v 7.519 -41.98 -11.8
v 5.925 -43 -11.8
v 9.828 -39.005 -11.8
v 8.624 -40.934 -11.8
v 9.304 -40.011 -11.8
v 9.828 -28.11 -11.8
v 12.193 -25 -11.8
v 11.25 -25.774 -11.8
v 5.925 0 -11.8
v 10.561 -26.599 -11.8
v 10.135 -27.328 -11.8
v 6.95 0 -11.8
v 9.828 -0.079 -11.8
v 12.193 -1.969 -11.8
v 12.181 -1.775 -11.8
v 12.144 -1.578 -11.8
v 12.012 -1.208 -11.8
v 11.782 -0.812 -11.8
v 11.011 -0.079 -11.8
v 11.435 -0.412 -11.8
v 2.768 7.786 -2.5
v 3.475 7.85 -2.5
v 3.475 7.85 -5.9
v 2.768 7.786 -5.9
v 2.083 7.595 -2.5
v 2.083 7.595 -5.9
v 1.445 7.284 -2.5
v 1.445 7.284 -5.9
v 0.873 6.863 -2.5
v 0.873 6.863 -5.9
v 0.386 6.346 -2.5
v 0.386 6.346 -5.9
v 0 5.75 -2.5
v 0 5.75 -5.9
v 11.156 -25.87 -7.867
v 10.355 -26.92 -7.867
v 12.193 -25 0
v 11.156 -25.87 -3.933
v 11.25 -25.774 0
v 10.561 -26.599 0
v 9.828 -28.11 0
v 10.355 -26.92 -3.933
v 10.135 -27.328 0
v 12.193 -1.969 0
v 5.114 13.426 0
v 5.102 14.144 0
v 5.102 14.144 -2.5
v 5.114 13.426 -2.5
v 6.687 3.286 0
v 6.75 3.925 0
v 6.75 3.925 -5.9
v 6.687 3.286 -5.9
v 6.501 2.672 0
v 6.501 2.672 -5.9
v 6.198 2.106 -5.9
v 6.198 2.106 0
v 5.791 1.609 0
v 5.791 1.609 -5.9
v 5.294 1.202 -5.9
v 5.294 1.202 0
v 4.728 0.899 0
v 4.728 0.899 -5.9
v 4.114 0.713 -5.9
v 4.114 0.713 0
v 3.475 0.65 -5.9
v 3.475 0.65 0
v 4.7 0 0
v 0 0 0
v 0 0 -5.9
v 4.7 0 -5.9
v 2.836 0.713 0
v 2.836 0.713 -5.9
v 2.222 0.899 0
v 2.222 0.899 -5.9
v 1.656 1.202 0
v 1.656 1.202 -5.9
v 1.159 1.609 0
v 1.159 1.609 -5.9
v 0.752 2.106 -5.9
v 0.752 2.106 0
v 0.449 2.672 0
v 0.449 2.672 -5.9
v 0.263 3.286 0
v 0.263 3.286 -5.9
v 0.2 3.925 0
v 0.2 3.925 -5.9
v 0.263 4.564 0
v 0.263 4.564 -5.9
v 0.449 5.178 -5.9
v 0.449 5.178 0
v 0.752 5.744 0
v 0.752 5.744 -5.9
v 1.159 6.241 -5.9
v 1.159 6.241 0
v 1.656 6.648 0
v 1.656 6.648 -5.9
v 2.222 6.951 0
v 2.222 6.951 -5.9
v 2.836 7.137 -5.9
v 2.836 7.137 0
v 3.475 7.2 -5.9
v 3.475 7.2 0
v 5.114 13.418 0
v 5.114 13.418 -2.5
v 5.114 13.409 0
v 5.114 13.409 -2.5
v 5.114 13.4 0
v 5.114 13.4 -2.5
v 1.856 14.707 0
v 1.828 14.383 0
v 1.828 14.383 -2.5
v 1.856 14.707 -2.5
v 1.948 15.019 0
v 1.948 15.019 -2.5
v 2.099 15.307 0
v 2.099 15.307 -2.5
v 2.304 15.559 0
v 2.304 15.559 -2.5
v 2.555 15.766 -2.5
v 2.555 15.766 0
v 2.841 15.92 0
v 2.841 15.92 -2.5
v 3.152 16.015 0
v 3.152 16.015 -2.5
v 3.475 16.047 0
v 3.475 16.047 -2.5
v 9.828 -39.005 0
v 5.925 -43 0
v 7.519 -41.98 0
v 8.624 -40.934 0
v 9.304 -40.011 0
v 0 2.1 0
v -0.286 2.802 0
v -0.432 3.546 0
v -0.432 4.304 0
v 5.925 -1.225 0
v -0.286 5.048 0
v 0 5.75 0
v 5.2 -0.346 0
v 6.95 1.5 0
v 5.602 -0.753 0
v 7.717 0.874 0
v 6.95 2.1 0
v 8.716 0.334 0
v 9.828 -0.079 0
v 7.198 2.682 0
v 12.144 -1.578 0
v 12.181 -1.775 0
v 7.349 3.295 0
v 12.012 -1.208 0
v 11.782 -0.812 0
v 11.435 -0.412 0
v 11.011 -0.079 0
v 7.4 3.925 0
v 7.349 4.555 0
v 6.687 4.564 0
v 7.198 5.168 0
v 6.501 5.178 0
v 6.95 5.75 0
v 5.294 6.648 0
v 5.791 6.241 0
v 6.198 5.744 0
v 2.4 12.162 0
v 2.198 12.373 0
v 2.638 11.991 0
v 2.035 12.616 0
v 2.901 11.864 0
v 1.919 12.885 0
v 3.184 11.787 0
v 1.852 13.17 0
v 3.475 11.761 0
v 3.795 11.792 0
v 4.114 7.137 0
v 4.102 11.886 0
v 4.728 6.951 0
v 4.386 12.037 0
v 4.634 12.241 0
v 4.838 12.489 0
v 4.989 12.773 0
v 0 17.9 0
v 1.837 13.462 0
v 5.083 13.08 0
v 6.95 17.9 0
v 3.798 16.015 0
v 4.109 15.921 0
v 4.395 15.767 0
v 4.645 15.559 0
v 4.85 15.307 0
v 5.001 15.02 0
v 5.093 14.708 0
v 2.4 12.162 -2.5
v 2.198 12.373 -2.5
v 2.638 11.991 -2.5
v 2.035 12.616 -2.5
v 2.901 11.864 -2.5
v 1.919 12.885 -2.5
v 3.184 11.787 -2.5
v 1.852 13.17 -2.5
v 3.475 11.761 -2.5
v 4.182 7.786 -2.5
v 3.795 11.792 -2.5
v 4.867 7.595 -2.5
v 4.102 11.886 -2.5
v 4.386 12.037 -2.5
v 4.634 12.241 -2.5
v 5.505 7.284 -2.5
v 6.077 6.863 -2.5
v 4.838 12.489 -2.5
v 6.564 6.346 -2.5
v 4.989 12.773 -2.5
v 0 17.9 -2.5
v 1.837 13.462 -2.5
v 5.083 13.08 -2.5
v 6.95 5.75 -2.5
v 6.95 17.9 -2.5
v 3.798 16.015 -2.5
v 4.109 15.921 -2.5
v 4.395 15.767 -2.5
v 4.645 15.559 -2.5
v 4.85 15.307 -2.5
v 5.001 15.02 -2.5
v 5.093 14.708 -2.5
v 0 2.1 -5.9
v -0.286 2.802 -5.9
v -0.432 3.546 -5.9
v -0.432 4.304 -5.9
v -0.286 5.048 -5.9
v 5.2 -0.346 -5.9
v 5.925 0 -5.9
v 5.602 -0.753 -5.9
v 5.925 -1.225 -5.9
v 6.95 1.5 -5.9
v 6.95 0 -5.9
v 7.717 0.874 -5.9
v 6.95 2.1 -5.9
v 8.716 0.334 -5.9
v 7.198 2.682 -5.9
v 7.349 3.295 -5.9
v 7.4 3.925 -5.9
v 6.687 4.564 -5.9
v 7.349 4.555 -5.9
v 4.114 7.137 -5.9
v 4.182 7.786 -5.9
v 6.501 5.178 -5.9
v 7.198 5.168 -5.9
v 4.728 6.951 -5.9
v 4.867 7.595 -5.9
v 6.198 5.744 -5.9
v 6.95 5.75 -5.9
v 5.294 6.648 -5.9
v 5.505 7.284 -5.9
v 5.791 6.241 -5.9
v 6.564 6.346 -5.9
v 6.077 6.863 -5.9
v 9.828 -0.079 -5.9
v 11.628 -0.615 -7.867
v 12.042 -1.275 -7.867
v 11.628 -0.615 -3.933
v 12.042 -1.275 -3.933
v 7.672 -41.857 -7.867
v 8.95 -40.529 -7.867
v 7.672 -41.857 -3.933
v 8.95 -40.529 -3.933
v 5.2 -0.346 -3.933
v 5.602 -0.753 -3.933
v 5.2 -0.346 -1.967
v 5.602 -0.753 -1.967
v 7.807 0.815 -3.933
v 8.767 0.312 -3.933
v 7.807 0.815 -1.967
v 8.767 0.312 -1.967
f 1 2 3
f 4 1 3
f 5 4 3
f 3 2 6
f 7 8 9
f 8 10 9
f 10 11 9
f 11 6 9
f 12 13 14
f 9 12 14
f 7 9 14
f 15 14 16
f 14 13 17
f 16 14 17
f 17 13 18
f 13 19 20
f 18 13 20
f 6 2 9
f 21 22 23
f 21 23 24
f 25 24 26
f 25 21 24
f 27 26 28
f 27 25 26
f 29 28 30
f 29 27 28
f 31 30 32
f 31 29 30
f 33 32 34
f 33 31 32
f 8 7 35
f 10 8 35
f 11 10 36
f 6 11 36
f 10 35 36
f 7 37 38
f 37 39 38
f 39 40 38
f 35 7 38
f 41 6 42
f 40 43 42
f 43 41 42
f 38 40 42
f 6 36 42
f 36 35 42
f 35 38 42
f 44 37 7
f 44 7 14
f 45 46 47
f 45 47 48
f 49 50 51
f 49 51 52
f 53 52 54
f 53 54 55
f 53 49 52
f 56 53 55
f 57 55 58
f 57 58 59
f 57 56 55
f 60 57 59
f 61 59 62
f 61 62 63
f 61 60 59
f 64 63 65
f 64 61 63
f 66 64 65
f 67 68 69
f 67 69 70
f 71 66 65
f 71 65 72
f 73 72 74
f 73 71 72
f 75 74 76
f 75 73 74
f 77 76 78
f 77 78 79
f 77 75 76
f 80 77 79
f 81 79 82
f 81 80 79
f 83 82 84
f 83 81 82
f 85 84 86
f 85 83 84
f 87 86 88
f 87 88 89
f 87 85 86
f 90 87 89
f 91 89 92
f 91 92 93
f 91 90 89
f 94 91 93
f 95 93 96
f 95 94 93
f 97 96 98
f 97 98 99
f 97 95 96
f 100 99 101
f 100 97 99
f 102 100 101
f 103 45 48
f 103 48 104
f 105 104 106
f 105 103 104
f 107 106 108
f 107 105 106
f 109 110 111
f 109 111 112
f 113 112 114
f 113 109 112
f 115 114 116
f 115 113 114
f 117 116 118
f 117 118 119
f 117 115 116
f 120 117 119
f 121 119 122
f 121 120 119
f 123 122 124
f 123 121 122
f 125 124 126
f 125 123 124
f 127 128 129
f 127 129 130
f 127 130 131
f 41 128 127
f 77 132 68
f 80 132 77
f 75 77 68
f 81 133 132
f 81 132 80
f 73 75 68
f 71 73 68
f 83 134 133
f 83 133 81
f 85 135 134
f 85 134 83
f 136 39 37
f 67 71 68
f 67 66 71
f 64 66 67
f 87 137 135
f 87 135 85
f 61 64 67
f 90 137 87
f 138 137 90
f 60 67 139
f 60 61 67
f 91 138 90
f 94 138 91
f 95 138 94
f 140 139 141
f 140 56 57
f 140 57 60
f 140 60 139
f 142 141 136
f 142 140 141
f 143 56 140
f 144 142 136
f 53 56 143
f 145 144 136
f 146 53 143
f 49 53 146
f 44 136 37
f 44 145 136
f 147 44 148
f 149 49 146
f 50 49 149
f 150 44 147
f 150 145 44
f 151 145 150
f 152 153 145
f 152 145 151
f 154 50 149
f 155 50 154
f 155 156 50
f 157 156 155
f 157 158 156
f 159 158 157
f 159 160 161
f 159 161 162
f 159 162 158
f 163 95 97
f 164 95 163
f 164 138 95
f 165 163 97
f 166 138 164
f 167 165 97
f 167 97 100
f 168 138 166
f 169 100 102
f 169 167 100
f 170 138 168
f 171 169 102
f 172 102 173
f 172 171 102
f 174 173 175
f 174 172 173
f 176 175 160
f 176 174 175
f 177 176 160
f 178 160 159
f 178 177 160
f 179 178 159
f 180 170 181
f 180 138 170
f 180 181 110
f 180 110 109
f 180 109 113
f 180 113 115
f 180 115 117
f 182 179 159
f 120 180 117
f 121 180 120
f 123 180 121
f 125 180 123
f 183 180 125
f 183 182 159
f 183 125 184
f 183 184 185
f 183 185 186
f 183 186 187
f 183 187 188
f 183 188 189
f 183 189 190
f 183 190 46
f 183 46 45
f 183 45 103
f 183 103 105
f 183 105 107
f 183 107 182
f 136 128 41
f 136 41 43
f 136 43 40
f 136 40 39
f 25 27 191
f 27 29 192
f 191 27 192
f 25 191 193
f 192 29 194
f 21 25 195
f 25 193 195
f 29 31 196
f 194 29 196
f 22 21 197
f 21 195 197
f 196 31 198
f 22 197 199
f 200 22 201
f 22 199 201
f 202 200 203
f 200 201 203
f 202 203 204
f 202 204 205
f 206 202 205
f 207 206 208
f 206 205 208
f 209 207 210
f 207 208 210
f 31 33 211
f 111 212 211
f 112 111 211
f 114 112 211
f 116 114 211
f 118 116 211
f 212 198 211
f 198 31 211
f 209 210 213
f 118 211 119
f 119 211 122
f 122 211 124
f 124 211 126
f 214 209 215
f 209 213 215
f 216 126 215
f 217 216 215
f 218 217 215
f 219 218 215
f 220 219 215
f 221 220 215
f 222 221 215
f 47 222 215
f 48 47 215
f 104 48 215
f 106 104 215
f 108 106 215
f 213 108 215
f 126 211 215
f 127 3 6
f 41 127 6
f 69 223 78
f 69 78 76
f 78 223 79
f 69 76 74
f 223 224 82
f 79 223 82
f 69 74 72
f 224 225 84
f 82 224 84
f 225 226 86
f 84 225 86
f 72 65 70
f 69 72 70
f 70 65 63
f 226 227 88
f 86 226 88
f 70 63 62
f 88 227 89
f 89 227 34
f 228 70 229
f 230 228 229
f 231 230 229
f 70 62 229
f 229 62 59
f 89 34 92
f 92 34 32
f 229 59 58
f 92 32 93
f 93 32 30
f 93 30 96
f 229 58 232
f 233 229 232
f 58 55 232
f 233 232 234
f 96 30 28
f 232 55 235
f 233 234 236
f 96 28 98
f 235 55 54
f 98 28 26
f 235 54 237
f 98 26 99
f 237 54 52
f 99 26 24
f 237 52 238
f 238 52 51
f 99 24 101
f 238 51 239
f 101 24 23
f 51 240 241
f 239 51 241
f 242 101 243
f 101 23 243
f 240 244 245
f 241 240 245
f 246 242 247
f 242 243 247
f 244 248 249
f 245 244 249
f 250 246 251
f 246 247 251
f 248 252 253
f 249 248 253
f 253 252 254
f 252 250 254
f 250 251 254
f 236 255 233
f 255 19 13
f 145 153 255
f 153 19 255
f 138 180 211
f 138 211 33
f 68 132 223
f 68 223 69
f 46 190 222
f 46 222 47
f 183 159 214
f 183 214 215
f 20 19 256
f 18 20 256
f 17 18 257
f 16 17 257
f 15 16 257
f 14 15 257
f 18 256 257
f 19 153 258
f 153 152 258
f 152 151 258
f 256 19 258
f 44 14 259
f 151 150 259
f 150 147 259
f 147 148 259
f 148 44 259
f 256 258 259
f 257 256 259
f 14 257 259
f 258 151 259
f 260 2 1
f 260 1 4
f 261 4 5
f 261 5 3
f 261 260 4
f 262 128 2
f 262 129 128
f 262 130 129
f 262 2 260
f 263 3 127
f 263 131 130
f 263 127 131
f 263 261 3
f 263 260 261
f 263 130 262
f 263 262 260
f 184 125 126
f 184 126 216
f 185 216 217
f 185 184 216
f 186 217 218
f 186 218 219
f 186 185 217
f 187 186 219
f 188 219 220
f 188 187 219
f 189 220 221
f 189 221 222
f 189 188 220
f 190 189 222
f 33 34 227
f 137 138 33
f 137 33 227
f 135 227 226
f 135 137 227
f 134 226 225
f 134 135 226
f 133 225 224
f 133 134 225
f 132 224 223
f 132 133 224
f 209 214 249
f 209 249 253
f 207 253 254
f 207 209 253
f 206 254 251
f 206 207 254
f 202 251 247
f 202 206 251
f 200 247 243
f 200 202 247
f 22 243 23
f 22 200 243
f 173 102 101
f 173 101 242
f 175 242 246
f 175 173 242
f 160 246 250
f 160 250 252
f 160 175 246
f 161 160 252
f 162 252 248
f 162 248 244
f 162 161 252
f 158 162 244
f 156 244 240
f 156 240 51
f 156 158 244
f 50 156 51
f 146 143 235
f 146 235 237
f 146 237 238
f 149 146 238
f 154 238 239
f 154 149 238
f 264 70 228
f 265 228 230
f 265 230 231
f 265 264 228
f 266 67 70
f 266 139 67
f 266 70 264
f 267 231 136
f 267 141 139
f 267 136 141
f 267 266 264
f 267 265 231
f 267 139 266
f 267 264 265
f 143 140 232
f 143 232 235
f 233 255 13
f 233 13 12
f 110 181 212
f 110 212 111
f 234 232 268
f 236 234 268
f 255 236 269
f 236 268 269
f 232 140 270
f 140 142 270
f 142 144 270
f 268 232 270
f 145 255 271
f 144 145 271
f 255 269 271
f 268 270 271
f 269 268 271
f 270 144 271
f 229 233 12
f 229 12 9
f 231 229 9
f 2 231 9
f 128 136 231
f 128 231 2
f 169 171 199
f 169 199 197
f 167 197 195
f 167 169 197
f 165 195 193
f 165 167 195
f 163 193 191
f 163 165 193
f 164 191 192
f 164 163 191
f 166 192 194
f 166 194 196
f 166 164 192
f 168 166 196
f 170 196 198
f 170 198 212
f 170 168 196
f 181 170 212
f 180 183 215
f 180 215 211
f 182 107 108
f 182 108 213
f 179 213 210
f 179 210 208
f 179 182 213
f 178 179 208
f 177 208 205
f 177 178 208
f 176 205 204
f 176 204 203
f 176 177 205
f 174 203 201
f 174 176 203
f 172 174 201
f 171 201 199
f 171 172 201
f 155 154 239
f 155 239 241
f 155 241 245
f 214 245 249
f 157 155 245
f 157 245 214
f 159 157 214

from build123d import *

# Parameters (mm, degrees)
F1_DEPTH = 5.9
F2_DEPTH = 2.5
F3_DEPTH = 11.8


with BuildPart() as f1:
    # F0 (on Top) → F1 (new body)
    with BuildSketch(Plane.XY):
        with BuildLine():
            Line((3.475, 0.65), (3.475, 0))
            ThreePointArc((3.475, 0), (4.7730375063, 0.2208504846), (5.925, 0.8585484677))
            ThreePointArc((5.925, 0.8585484677), (6.5018486959, 1.426237912), (6.95, 2.1001712409))
            Line((6.95, 2.1001712409), (6.95, 5.7498287591))
            ThreePointArc((6.95, 5.7498287591), (5.5051689733, 7.2841723593), (3.475, 7.85))
            Line((3.475, 7.85), (3.475, 7.2))
            ThreePointArc((3.475, 7.2), (5.7907747084, 6.2407747084), (6.75, 3.925))
            ThreePointArc((6.75, 3.925), (5.7907747084, 1.6092252916), (3.475, 0.65))
        make_face()
        with BuildLine():
            Line((0, 5.7498287591), (0, 2.1001712409))
            ThreePointArc((0, 2.1001712409), (0.4481513041, 1.426237912), (1.025, 0.8585484677))
            ThreePointArc((1.025, 0.8585484677), (2.1769624937, 0.2208504846), (3.475, 0))
            Line((3.475, 0), (3.475, 0.65))
            ThreePointArc((3.475, 0.65), (0.2, 3.925), (3.475, 7.2))
            Line((3.475, 7.2), (3.475, 7.85))
            ThreePointArc((3.475, 7.85), (1.4448310267, 7.2841723593), (0, 5.7498287591))
        make_face()
        with BuildLine():
            Line((0, 2.1001712409), (0, 0))
            Line((0, 0), (1.025, 0))
            Line((1.025, 0), (1.025, 0.8585484677))
            ThreePointArc((1.025, 0.8585484677), (0.4481513041, 1.426237912), (0, 2.1001712409))
        make_face()
        with BuildLine():
            Line((1.025, 0.8585484677), (1.025, 0))
            Line((1.025, 0), (3.475, 0))
            ThreePointArc((3.475, 0), (2.1769624937, 0.2208504846), (1.025, 0.8585484677))
        make_face()
        with BuildLine():
            ThreePointArc((0, 5.7498287591), (-0.45, 3.925), (0, 2.1001712409))
            Line((0, 2.1001712409), (0, 5.7498287591))
        make_face()
        with BuildLine():
            Line((6.95, 5.7498287591), (6.95, 2.1001712409))
            ThreePointArc((6.95, 2.1001712409), (7.2858398025, 2.9852526935), (7.4, 3.925))
            ThreePointArc((7.4, 3.925), (7.2858398025, 4.8647473065), (6.95, 5.7498287591))
        make_face()
        with BuildLine():
            ThreePointArc((6.95, 2.1001712409), (6.5018486959, 1.426237912), (5.925, 0.8585484677))
            Line((5.925, 0.8585484677), (5.925, 0))
            Line((5.925, 0), (6.95, 0))
            Line((6.95, 0), (6.95, 1.44))
            Line((6.95, 1.44), (6.95, 1.5))
            Line((6.95, 1.5), (6.95, 2.1001712409))
        make_face()
        with BuildLine():
            ThreePointArc((5.925, 0.8585484677), (4.7730375063, 0.2208504846), (3.475, 0))
            Line((3.475, 0), (4.7, 0))
            Line((4.7, 0), (5.925, 0))
            Line((5.925, 0), (5.925, 0.8585484677))
        make_face()
        with BuildLine():
            Line((5.925, 0), (4.7, 0))
            add(Edge.make_bspline(
                [(4.7, 0), (5.2537494339, -0.3164176305), (5.6369397789, -0.7196032093), (5.925, -1.225)],
                knots=[0, 0, 0, 0, 1.7324116139, 1.7324116139, 1.7324116139, 1.7324116139], degree=3))
            Line((5.925, -1.225), (5.925, -0.079424061))
            Line((5.925, -0.079424061), (5.925, 0))
        make_face()
        with BuildLine():
            Line((6.95, 1.44), (6.95, 0))
            Line((6.95, 0), (9.8284865708, -0.079424061))
            add(Edge.make_bspline(
                [(6.95, 1.5), (7.7566024847, 0.7003984647), (8.7155010551, 0.2800084476), (9.8284865708, -0.079424061)],
                knots=[0, 0, 0, 0, 3.2833314336, 3.2833314336, 3.2833314336, 3.2833314336], degree=3))
            Line((6.95, 1.5), (6.95, 1.44))
        make_face()
    extrude(amount=-F1_DEPTH)

    # F0 (on Top) → F2 (join)
    with BuildSketch(Plane.XY):
        with BuildLine():
            Line((0, 7.85), (0, 5.7498287591))
            ThreePointArc((0, 5.7498287591), (1.4448310267, 7.2841723593), (3.475, 7.85))
            ThreePointArc((3.475, 7.85), (5.5051689733, 7.2841723593), (6.95, 5.7498287591))
            Line((6.95, 5.7498287591), (6.95, 17.9))
            Line((6.95, 17.9), (3.475, 17.9))
            Line((3.475, 17.9), (0, 17.9))
            Line((0, 17.9), (0, 7.85))
        make_face()
        with BuildLine():
            ThreePointArc((1.8276640256, 14.3833613398), (2.3042302705, 15.55900427), (3.475, 16.0474200003))
            ThreePointArc((3.475, 16.0474200003), (4.5253988967, 15.6691157612), (5.0933824344, 14.7079463483))
            Line((5.0933824344, 14.7079463483), (5.1024433757, 14.1442252627))
            Line((5.1024433757, 14.1442252627), (5.113982201, 13.4263440945))
            ThreePointArc((5.113982201, 13.4263440945), (5.1141409801, 13.4131724726), (5.1141939076, 13.4))
            ThreePointArc((5.1141939076, 13.4), (4.6340851277, 12.2409148723), (3.475, 11.7608060924))
            ThreePointArc((3.475, 11.7608060924), (2.2942628451, 12.2629791393), (1.8369719791, 13.4618131819))
            Line((1.8369719791, 13.4618131819), (1.8276640256, 14.3833613398))
        make_face(mode=Mode.SUBTRACT)
    extrude(amount=-F2_DEPTH)

    # F0 (on Top) → F3 (join)
    with BuildSketch(Plane.XY):
        with BuildLine():
            Line((9.8284865708, -25), (5.925, -25))
            Line((5.925, -25), (5.925, -26.9515))
            Line((5.925, -26.9515), (5.925, -28.903))
            Line((5.925, -28.903), (5.925, -43))
            add(Edge.make_bspline(
                [(5.925, -43), (7.9286471009, -41.9465117157), (9.1273570433, -40.6301692128), (9.8284865708, -39.0049032867)],
                knots=[0, 0, 0, 0, 5.5855174476, 5.5855174476, 5.5855174476, 5.5855174476], degree=3))
            Line((9.8284865708, -39.0049032867), (9.8284865708, -28.1095039099))
            Line((9.8284865708, -28.1095039099), (9.8284865708, -25))
        make_face()
        with BuildLine():
            Line((12.1934865708, -25), (9.8284865708, -25))
            Line((9.8284865708, -25), (9.8284865708, -28.1095039099))
            add(Edge.make_bspline(
                [(12.1934865708, -25), (11.0498676077, -25.7655549794), (10.2052474394, -26.863457635), (9.8284865708, -28.1095039099)],
                knots=[0, 0, 0, 0, 3.9066916395, 3.9066916395, 3.9066916395, 3.9066916395], degree=3))
        make_face()
        Polygon((6.95, 0), (5.925, 0), (5.925, -0.079424061), (5.925, -1.225), (5.925, -21.3844068348), (5.925, -22.55), (5.925, -22.9875), (5.925, -25), (9.8284865708, -25), (9.8284865708, -0.079424061), align=None)
        with BuildLine():
            Line((11.0109865708, -0.079424061), (9.8284865708, -0.079424061))
            Line((9.8284865708, -0.079424061), (9.8284865708, -25))
            Line((9.8284865708, -25), (12.1934865708, -25))
            Line((12.1934865708, -25), (12.1934865708, -1.9685707521))
            add(Edge.make_bspline(
                [(11.0109865708, -0.079424061), (11.7086665705, -0.5204698537), (12.1934865708, -1.29045418), (12.1934865708, -1.9685707521)],
                knots=[0, 0, 0, 0, 2.2287174496, 2.2287174496, 2.2287174496, 2.2287174496], degree=3))
        make_face()
    extrude(amount=-F3_DEPTH)


solid = f1.part
